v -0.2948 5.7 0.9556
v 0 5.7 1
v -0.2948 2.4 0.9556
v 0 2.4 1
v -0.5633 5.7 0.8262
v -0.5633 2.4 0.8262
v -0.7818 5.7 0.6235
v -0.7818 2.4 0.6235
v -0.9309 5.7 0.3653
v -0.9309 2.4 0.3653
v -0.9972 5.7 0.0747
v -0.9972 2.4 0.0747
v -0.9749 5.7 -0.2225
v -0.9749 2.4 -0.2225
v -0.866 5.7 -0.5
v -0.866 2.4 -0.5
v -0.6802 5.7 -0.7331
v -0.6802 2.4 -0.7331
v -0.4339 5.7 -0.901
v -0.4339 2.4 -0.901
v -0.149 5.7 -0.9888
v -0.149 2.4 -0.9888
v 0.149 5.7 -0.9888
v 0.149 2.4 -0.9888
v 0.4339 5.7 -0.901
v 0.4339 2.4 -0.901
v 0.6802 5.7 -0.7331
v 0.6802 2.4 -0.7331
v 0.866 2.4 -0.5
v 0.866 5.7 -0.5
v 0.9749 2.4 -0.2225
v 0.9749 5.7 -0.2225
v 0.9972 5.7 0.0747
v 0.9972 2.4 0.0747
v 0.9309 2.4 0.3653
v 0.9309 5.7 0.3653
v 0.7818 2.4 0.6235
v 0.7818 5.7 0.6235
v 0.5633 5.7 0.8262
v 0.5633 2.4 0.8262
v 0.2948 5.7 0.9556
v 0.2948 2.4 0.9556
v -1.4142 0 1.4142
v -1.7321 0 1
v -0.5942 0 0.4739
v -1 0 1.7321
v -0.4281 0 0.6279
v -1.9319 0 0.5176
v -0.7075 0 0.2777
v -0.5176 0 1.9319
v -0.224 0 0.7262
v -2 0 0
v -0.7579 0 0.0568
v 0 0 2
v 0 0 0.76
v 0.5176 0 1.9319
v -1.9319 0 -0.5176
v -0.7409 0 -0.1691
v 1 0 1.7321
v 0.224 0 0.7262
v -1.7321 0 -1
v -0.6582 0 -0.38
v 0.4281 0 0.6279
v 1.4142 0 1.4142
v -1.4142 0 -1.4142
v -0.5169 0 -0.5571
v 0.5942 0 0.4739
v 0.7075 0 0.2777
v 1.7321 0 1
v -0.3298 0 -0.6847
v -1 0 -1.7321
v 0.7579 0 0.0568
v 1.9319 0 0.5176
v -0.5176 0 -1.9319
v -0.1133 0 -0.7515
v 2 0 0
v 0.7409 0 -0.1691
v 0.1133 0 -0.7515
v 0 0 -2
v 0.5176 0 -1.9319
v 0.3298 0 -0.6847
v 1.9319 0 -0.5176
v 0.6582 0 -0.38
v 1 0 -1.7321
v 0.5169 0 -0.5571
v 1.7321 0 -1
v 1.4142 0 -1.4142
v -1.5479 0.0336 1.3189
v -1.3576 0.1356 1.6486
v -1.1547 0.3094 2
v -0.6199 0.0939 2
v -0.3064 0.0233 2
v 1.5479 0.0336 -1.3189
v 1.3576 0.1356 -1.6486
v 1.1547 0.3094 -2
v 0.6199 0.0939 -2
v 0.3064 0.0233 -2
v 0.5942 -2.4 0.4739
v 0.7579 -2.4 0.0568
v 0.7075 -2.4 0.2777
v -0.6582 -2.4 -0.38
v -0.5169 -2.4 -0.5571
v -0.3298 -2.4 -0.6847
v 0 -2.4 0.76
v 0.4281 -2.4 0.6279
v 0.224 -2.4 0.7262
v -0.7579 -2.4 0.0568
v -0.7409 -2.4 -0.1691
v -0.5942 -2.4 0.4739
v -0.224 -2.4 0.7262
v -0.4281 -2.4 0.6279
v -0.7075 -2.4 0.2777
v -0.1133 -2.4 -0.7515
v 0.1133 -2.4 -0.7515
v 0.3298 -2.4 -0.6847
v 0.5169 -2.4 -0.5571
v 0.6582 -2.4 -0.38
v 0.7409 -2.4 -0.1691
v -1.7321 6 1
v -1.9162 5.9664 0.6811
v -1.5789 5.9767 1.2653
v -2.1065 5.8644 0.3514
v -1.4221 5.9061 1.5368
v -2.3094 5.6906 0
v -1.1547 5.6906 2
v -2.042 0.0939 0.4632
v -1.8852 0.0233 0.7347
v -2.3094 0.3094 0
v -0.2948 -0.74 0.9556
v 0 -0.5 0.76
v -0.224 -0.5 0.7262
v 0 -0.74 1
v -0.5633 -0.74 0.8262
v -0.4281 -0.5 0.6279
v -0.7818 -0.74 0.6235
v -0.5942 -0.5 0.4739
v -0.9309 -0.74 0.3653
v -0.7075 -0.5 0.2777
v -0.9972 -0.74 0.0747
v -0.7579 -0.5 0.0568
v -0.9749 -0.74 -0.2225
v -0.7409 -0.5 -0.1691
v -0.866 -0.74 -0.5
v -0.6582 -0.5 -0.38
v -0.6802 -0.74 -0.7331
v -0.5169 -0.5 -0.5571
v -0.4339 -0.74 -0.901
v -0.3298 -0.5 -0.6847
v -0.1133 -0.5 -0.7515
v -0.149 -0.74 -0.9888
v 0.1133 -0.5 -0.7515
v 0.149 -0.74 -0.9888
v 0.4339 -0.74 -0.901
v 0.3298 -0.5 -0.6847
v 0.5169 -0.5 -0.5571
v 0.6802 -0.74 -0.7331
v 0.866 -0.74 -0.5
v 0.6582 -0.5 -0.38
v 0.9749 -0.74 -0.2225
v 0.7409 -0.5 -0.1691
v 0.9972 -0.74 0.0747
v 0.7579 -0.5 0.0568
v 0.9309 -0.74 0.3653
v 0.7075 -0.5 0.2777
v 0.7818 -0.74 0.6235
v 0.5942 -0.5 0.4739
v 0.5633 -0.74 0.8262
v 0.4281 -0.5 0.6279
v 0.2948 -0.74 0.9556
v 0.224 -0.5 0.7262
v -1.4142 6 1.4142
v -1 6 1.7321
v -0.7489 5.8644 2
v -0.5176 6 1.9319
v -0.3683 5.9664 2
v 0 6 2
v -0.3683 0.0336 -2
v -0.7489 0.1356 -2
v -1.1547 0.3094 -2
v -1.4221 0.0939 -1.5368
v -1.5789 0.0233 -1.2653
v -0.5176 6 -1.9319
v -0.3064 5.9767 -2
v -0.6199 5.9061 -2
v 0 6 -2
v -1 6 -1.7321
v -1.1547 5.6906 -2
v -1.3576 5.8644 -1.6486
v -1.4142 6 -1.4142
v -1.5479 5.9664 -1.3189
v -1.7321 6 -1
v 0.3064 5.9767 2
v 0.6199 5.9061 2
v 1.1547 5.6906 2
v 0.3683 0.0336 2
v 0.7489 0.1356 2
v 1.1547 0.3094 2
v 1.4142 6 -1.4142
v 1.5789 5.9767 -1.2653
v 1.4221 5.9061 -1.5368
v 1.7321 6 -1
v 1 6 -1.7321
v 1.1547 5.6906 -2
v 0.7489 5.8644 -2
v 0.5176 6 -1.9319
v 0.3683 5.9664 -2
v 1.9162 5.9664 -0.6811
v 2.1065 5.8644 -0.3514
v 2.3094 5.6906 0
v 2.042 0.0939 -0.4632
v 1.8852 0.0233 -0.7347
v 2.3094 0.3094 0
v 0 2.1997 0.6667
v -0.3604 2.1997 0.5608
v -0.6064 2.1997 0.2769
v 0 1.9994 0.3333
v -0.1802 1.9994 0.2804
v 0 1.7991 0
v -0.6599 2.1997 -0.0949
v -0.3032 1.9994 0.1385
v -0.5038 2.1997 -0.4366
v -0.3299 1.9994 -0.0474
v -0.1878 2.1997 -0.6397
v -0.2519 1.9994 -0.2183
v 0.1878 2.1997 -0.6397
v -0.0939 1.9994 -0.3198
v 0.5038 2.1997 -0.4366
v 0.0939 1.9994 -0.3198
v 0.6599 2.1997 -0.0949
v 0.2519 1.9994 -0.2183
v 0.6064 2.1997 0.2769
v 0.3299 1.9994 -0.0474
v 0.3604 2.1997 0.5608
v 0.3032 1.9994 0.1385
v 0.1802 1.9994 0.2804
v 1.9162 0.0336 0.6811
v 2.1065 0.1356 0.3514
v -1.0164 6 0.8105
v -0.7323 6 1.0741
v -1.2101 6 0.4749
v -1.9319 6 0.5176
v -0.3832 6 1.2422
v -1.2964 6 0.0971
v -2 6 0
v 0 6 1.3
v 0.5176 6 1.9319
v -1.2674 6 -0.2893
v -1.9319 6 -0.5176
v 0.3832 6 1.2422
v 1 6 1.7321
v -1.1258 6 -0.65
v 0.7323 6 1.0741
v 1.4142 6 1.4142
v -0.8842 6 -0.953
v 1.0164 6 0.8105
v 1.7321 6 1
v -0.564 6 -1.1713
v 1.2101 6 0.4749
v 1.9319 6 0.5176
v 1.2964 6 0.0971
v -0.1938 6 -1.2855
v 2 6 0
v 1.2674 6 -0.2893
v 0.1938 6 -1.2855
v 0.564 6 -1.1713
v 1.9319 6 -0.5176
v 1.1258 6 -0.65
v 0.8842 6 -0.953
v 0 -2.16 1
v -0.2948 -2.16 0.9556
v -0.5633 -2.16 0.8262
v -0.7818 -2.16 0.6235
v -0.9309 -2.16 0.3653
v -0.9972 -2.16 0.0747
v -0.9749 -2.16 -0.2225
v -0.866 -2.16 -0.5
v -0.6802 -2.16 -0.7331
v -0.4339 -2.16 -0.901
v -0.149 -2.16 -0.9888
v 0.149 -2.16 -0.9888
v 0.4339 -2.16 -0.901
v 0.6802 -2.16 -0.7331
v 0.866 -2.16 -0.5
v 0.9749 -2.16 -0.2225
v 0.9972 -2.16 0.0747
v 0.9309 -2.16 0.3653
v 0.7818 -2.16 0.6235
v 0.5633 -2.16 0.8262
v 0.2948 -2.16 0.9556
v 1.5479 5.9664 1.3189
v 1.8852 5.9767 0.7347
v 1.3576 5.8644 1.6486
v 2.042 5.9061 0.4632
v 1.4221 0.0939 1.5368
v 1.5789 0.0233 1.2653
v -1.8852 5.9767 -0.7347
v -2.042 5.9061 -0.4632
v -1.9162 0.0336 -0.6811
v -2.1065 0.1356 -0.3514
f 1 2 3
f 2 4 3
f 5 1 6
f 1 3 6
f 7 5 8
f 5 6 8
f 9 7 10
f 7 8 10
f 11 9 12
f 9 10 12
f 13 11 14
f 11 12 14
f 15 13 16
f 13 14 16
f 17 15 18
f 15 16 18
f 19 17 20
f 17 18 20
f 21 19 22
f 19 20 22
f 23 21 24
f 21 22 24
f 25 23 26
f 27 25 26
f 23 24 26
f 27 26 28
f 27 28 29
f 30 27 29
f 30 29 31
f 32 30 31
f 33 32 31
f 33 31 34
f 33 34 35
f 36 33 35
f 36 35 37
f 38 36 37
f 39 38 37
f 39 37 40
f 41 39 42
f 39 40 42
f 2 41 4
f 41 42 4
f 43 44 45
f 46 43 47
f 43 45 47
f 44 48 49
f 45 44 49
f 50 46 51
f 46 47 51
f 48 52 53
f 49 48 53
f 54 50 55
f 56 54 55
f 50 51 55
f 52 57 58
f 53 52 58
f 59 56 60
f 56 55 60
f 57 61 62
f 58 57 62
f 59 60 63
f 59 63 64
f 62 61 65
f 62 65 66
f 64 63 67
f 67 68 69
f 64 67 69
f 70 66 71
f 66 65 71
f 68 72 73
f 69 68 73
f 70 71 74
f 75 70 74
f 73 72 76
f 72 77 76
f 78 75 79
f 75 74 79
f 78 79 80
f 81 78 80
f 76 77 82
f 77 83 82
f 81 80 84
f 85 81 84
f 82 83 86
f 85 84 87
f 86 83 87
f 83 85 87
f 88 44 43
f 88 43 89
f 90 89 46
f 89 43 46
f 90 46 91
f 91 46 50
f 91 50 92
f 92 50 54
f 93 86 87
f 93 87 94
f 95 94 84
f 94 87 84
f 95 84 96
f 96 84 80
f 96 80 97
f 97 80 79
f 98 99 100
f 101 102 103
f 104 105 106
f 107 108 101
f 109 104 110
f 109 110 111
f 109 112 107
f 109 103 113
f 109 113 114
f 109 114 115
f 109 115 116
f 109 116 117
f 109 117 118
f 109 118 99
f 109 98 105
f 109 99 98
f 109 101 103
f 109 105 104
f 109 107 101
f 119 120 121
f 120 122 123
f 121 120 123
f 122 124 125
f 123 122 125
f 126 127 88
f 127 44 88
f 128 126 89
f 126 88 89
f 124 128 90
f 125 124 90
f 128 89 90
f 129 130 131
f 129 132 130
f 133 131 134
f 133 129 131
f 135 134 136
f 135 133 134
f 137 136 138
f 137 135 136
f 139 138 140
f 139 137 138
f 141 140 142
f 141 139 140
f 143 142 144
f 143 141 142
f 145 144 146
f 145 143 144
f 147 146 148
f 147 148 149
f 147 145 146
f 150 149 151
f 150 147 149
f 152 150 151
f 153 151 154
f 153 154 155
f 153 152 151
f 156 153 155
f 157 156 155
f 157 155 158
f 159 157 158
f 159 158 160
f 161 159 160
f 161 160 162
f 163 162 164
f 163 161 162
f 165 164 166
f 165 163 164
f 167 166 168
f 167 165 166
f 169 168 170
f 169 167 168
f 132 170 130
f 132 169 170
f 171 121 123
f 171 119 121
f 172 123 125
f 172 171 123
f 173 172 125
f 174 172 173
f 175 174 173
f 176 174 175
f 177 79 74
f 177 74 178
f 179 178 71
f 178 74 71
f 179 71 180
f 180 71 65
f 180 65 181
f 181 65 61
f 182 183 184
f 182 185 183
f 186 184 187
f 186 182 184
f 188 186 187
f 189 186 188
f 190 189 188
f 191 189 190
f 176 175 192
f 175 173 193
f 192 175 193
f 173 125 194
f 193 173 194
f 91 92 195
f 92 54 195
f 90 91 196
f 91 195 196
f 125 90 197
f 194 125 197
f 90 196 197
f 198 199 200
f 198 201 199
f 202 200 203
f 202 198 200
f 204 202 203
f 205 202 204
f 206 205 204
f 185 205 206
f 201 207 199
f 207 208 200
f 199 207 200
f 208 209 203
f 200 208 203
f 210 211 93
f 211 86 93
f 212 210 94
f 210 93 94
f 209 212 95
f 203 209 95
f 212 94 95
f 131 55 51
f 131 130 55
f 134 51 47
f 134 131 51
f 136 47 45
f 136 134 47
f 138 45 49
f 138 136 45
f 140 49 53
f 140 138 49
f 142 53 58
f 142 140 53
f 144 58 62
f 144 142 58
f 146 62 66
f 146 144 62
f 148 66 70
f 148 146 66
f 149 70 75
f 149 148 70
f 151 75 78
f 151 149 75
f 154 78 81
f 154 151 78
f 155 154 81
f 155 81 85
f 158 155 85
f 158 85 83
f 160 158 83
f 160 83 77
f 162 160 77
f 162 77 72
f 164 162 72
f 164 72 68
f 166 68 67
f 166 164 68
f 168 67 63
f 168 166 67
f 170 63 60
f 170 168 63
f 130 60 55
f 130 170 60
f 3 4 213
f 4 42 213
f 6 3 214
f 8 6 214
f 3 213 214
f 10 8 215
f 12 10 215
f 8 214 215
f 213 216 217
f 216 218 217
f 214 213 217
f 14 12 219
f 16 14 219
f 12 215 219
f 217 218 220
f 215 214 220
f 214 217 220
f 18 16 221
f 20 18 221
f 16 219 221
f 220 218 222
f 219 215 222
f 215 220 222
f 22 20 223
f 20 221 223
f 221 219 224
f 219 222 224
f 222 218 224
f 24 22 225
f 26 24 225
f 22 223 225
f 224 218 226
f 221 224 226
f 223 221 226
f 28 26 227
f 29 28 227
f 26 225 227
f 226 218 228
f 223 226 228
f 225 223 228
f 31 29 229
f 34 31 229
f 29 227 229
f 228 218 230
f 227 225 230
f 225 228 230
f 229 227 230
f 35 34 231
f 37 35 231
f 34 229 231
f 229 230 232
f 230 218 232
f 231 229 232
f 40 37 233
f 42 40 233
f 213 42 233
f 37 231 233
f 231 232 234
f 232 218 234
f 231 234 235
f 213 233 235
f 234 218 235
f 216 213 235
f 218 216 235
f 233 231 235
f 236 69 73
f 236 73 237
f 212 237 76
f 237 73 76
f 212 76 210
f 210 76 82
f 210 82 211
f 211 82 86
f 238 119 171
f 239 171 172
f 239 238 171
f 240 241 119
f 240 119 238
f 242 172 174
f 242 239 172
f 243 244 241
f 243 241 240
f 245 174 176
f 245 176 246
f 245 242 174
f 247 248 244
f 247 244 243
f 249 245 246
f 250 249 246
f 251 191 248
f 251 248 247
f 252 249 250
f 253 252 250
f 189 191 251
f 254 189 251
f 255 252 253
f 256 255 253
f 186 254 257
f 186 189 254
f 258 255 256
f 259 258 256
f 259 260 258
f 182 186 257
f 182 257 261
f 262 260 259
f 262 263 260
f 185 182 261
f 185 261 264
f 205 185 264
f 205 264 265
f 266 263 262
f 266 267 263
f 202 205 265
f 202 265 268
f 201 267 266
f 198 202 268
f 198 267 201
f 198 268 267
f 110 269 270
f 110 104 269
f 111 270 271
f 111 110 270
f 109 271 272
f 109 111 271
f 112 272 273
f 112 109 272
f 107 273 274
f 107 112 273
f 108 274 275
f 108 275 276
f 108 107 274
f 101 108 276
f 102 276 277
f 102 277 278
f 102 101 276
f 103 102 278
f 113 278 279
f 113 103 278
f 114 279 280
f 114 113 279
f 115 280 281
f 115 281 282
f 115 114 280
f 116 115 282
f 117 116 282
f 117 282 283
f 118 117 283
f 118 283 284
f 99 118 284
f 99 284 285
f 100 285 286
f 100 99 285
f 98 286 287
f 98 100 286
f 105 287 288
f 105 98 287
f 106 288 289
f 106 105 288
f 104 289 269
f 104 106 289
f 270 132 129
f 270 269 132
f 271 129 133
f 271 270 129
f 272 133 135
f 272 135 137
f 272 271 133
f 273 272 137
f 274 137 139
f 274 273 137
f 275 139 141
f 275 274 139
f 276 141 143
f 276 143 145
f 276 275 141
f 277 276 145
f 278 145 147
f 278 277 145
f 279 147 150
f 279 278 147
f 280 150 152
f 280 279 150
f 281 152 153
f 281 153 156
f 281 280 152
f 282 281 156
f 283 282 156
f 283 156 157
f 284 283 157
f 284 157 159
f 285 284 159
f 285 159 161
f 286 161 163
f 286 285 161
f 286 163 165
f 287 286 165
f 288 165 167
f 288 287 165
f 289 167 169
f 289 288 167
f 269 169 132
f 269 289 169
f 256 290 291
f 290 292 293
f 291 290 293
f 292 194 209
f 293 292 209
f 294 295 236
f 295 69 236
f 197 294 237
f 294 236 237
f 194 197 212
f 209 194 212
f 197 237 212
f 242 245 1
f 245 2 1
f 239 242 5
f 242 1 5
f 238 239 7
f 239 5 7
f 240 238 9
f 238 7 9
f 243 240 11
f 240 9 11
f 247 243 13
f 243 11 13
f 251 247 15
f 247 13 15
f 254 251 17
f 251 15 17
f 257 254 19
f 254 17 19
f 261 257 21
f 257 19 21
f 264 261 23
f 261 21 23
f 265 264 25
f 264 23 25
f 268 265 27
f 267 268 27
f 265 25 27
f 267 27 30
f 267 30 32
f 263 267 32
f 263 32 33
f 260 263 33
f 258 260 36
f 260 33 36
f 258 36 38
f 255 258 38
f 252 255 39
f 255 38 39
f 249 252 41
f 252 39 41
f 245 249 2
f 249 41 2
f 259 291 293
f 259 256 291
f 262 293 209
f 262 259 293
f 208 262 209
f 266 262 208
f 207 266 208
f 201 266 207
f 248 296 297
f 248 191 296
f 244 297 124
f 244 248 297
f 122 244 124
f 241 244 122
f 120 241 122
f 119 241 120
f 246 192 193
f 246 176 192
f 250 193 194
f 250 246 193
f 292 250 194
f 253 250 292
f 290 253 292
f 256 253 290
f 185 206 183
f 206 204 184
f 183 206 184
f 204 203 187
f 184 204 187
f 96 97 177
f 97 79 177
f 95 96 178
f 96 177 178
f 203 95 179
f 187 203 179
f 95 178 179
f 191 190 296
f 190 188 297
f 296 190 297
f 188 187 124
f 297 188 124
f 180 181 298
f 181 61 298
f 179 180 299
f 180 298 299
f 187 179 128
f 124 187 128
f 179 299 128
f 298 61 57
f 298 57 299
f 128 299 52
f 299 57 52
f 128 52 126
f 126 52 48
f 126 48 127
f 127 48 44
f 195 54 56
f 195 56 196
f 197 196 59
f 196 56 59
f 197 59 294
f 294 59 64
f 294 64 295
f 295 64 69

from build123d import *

# Parameters (mm, degrees)
EXTRUDE1_DEPTH = 6


with BuildPart() as part:
    # Sketch1 → Extrude1 (new body)
    with BuildSketch(Plane(origin=(0, 0, 0), x_dir=(1, 0, 0), z_dir=(0, 1, 0))):
        Polygon((1.154700538, 2), (-1.154700538, 2), (-2.309401077, 0), (-1.154700538, -2), (1.154700538, -2), (2.309401077, 0), align=None)
    extrude(amount=EXTRUDE1_DEPTH)

    # Sketch2 → Revolve1 (revolve)
    with BuildSketch(Plane(origin=(0, 0, 0), x_dir=(0, 0, -1), z_dir=(1, 0, 0)), mode=Mode.PRIVATE) as revolve1_sk:
        Polygon((0.76, 0), (0.76, -0.5), (1, -0.74), (1, -2.16), (0.76, -2.4), (0, -2.4), (0, 0), align=None)
    revolve(revolve1_sk.sketch.rotate(Axis((0, 0, 0), (0, -1, 0)), 180), axis=Axis((0, 0, 0), (0, -1, 0)))

    # Sketch3 → Cut-Revolve1 (revolve, cut)
    with BuildSketch(Plane(origin=(0, 0, 0), x_dir=(0, 0, -1), z_dir=(1, 0, 0)), mode=Mode.PRIVATE) as cut_revolve1_sk:
        Polygon((1.3, 6), (1, 5.7), (1, 2.4), (0, 1.799139381), (0, 6), align=None)
    revolve(cut_revolve1_sk.sketch.rotate(Axis((0, 6, 0), (0, -1, 0)), 180), axis=Axis((0, 6, 0), (0, -1, 0)), mode=Mode.SUBTRACT)

    # Sketch4 → Cut-Revolve3 (revolve, cut)
    with BuildSketch(Plane(origin=(0, 0, 0), x_dir=(0, 0, -1), z_dir=(1, 0, 0))):
        Polygon((2, 6), (4.5, 6), (4.5, 3.5), align=None)
        Polygon((2, 0), (4.5, 0), (4.5, 2.5), align=None)
    revolve(axis=Axis((0, 0, 0), (0, 1, 0)), mode=Mode.SUBTRACT)


solid = part.part
